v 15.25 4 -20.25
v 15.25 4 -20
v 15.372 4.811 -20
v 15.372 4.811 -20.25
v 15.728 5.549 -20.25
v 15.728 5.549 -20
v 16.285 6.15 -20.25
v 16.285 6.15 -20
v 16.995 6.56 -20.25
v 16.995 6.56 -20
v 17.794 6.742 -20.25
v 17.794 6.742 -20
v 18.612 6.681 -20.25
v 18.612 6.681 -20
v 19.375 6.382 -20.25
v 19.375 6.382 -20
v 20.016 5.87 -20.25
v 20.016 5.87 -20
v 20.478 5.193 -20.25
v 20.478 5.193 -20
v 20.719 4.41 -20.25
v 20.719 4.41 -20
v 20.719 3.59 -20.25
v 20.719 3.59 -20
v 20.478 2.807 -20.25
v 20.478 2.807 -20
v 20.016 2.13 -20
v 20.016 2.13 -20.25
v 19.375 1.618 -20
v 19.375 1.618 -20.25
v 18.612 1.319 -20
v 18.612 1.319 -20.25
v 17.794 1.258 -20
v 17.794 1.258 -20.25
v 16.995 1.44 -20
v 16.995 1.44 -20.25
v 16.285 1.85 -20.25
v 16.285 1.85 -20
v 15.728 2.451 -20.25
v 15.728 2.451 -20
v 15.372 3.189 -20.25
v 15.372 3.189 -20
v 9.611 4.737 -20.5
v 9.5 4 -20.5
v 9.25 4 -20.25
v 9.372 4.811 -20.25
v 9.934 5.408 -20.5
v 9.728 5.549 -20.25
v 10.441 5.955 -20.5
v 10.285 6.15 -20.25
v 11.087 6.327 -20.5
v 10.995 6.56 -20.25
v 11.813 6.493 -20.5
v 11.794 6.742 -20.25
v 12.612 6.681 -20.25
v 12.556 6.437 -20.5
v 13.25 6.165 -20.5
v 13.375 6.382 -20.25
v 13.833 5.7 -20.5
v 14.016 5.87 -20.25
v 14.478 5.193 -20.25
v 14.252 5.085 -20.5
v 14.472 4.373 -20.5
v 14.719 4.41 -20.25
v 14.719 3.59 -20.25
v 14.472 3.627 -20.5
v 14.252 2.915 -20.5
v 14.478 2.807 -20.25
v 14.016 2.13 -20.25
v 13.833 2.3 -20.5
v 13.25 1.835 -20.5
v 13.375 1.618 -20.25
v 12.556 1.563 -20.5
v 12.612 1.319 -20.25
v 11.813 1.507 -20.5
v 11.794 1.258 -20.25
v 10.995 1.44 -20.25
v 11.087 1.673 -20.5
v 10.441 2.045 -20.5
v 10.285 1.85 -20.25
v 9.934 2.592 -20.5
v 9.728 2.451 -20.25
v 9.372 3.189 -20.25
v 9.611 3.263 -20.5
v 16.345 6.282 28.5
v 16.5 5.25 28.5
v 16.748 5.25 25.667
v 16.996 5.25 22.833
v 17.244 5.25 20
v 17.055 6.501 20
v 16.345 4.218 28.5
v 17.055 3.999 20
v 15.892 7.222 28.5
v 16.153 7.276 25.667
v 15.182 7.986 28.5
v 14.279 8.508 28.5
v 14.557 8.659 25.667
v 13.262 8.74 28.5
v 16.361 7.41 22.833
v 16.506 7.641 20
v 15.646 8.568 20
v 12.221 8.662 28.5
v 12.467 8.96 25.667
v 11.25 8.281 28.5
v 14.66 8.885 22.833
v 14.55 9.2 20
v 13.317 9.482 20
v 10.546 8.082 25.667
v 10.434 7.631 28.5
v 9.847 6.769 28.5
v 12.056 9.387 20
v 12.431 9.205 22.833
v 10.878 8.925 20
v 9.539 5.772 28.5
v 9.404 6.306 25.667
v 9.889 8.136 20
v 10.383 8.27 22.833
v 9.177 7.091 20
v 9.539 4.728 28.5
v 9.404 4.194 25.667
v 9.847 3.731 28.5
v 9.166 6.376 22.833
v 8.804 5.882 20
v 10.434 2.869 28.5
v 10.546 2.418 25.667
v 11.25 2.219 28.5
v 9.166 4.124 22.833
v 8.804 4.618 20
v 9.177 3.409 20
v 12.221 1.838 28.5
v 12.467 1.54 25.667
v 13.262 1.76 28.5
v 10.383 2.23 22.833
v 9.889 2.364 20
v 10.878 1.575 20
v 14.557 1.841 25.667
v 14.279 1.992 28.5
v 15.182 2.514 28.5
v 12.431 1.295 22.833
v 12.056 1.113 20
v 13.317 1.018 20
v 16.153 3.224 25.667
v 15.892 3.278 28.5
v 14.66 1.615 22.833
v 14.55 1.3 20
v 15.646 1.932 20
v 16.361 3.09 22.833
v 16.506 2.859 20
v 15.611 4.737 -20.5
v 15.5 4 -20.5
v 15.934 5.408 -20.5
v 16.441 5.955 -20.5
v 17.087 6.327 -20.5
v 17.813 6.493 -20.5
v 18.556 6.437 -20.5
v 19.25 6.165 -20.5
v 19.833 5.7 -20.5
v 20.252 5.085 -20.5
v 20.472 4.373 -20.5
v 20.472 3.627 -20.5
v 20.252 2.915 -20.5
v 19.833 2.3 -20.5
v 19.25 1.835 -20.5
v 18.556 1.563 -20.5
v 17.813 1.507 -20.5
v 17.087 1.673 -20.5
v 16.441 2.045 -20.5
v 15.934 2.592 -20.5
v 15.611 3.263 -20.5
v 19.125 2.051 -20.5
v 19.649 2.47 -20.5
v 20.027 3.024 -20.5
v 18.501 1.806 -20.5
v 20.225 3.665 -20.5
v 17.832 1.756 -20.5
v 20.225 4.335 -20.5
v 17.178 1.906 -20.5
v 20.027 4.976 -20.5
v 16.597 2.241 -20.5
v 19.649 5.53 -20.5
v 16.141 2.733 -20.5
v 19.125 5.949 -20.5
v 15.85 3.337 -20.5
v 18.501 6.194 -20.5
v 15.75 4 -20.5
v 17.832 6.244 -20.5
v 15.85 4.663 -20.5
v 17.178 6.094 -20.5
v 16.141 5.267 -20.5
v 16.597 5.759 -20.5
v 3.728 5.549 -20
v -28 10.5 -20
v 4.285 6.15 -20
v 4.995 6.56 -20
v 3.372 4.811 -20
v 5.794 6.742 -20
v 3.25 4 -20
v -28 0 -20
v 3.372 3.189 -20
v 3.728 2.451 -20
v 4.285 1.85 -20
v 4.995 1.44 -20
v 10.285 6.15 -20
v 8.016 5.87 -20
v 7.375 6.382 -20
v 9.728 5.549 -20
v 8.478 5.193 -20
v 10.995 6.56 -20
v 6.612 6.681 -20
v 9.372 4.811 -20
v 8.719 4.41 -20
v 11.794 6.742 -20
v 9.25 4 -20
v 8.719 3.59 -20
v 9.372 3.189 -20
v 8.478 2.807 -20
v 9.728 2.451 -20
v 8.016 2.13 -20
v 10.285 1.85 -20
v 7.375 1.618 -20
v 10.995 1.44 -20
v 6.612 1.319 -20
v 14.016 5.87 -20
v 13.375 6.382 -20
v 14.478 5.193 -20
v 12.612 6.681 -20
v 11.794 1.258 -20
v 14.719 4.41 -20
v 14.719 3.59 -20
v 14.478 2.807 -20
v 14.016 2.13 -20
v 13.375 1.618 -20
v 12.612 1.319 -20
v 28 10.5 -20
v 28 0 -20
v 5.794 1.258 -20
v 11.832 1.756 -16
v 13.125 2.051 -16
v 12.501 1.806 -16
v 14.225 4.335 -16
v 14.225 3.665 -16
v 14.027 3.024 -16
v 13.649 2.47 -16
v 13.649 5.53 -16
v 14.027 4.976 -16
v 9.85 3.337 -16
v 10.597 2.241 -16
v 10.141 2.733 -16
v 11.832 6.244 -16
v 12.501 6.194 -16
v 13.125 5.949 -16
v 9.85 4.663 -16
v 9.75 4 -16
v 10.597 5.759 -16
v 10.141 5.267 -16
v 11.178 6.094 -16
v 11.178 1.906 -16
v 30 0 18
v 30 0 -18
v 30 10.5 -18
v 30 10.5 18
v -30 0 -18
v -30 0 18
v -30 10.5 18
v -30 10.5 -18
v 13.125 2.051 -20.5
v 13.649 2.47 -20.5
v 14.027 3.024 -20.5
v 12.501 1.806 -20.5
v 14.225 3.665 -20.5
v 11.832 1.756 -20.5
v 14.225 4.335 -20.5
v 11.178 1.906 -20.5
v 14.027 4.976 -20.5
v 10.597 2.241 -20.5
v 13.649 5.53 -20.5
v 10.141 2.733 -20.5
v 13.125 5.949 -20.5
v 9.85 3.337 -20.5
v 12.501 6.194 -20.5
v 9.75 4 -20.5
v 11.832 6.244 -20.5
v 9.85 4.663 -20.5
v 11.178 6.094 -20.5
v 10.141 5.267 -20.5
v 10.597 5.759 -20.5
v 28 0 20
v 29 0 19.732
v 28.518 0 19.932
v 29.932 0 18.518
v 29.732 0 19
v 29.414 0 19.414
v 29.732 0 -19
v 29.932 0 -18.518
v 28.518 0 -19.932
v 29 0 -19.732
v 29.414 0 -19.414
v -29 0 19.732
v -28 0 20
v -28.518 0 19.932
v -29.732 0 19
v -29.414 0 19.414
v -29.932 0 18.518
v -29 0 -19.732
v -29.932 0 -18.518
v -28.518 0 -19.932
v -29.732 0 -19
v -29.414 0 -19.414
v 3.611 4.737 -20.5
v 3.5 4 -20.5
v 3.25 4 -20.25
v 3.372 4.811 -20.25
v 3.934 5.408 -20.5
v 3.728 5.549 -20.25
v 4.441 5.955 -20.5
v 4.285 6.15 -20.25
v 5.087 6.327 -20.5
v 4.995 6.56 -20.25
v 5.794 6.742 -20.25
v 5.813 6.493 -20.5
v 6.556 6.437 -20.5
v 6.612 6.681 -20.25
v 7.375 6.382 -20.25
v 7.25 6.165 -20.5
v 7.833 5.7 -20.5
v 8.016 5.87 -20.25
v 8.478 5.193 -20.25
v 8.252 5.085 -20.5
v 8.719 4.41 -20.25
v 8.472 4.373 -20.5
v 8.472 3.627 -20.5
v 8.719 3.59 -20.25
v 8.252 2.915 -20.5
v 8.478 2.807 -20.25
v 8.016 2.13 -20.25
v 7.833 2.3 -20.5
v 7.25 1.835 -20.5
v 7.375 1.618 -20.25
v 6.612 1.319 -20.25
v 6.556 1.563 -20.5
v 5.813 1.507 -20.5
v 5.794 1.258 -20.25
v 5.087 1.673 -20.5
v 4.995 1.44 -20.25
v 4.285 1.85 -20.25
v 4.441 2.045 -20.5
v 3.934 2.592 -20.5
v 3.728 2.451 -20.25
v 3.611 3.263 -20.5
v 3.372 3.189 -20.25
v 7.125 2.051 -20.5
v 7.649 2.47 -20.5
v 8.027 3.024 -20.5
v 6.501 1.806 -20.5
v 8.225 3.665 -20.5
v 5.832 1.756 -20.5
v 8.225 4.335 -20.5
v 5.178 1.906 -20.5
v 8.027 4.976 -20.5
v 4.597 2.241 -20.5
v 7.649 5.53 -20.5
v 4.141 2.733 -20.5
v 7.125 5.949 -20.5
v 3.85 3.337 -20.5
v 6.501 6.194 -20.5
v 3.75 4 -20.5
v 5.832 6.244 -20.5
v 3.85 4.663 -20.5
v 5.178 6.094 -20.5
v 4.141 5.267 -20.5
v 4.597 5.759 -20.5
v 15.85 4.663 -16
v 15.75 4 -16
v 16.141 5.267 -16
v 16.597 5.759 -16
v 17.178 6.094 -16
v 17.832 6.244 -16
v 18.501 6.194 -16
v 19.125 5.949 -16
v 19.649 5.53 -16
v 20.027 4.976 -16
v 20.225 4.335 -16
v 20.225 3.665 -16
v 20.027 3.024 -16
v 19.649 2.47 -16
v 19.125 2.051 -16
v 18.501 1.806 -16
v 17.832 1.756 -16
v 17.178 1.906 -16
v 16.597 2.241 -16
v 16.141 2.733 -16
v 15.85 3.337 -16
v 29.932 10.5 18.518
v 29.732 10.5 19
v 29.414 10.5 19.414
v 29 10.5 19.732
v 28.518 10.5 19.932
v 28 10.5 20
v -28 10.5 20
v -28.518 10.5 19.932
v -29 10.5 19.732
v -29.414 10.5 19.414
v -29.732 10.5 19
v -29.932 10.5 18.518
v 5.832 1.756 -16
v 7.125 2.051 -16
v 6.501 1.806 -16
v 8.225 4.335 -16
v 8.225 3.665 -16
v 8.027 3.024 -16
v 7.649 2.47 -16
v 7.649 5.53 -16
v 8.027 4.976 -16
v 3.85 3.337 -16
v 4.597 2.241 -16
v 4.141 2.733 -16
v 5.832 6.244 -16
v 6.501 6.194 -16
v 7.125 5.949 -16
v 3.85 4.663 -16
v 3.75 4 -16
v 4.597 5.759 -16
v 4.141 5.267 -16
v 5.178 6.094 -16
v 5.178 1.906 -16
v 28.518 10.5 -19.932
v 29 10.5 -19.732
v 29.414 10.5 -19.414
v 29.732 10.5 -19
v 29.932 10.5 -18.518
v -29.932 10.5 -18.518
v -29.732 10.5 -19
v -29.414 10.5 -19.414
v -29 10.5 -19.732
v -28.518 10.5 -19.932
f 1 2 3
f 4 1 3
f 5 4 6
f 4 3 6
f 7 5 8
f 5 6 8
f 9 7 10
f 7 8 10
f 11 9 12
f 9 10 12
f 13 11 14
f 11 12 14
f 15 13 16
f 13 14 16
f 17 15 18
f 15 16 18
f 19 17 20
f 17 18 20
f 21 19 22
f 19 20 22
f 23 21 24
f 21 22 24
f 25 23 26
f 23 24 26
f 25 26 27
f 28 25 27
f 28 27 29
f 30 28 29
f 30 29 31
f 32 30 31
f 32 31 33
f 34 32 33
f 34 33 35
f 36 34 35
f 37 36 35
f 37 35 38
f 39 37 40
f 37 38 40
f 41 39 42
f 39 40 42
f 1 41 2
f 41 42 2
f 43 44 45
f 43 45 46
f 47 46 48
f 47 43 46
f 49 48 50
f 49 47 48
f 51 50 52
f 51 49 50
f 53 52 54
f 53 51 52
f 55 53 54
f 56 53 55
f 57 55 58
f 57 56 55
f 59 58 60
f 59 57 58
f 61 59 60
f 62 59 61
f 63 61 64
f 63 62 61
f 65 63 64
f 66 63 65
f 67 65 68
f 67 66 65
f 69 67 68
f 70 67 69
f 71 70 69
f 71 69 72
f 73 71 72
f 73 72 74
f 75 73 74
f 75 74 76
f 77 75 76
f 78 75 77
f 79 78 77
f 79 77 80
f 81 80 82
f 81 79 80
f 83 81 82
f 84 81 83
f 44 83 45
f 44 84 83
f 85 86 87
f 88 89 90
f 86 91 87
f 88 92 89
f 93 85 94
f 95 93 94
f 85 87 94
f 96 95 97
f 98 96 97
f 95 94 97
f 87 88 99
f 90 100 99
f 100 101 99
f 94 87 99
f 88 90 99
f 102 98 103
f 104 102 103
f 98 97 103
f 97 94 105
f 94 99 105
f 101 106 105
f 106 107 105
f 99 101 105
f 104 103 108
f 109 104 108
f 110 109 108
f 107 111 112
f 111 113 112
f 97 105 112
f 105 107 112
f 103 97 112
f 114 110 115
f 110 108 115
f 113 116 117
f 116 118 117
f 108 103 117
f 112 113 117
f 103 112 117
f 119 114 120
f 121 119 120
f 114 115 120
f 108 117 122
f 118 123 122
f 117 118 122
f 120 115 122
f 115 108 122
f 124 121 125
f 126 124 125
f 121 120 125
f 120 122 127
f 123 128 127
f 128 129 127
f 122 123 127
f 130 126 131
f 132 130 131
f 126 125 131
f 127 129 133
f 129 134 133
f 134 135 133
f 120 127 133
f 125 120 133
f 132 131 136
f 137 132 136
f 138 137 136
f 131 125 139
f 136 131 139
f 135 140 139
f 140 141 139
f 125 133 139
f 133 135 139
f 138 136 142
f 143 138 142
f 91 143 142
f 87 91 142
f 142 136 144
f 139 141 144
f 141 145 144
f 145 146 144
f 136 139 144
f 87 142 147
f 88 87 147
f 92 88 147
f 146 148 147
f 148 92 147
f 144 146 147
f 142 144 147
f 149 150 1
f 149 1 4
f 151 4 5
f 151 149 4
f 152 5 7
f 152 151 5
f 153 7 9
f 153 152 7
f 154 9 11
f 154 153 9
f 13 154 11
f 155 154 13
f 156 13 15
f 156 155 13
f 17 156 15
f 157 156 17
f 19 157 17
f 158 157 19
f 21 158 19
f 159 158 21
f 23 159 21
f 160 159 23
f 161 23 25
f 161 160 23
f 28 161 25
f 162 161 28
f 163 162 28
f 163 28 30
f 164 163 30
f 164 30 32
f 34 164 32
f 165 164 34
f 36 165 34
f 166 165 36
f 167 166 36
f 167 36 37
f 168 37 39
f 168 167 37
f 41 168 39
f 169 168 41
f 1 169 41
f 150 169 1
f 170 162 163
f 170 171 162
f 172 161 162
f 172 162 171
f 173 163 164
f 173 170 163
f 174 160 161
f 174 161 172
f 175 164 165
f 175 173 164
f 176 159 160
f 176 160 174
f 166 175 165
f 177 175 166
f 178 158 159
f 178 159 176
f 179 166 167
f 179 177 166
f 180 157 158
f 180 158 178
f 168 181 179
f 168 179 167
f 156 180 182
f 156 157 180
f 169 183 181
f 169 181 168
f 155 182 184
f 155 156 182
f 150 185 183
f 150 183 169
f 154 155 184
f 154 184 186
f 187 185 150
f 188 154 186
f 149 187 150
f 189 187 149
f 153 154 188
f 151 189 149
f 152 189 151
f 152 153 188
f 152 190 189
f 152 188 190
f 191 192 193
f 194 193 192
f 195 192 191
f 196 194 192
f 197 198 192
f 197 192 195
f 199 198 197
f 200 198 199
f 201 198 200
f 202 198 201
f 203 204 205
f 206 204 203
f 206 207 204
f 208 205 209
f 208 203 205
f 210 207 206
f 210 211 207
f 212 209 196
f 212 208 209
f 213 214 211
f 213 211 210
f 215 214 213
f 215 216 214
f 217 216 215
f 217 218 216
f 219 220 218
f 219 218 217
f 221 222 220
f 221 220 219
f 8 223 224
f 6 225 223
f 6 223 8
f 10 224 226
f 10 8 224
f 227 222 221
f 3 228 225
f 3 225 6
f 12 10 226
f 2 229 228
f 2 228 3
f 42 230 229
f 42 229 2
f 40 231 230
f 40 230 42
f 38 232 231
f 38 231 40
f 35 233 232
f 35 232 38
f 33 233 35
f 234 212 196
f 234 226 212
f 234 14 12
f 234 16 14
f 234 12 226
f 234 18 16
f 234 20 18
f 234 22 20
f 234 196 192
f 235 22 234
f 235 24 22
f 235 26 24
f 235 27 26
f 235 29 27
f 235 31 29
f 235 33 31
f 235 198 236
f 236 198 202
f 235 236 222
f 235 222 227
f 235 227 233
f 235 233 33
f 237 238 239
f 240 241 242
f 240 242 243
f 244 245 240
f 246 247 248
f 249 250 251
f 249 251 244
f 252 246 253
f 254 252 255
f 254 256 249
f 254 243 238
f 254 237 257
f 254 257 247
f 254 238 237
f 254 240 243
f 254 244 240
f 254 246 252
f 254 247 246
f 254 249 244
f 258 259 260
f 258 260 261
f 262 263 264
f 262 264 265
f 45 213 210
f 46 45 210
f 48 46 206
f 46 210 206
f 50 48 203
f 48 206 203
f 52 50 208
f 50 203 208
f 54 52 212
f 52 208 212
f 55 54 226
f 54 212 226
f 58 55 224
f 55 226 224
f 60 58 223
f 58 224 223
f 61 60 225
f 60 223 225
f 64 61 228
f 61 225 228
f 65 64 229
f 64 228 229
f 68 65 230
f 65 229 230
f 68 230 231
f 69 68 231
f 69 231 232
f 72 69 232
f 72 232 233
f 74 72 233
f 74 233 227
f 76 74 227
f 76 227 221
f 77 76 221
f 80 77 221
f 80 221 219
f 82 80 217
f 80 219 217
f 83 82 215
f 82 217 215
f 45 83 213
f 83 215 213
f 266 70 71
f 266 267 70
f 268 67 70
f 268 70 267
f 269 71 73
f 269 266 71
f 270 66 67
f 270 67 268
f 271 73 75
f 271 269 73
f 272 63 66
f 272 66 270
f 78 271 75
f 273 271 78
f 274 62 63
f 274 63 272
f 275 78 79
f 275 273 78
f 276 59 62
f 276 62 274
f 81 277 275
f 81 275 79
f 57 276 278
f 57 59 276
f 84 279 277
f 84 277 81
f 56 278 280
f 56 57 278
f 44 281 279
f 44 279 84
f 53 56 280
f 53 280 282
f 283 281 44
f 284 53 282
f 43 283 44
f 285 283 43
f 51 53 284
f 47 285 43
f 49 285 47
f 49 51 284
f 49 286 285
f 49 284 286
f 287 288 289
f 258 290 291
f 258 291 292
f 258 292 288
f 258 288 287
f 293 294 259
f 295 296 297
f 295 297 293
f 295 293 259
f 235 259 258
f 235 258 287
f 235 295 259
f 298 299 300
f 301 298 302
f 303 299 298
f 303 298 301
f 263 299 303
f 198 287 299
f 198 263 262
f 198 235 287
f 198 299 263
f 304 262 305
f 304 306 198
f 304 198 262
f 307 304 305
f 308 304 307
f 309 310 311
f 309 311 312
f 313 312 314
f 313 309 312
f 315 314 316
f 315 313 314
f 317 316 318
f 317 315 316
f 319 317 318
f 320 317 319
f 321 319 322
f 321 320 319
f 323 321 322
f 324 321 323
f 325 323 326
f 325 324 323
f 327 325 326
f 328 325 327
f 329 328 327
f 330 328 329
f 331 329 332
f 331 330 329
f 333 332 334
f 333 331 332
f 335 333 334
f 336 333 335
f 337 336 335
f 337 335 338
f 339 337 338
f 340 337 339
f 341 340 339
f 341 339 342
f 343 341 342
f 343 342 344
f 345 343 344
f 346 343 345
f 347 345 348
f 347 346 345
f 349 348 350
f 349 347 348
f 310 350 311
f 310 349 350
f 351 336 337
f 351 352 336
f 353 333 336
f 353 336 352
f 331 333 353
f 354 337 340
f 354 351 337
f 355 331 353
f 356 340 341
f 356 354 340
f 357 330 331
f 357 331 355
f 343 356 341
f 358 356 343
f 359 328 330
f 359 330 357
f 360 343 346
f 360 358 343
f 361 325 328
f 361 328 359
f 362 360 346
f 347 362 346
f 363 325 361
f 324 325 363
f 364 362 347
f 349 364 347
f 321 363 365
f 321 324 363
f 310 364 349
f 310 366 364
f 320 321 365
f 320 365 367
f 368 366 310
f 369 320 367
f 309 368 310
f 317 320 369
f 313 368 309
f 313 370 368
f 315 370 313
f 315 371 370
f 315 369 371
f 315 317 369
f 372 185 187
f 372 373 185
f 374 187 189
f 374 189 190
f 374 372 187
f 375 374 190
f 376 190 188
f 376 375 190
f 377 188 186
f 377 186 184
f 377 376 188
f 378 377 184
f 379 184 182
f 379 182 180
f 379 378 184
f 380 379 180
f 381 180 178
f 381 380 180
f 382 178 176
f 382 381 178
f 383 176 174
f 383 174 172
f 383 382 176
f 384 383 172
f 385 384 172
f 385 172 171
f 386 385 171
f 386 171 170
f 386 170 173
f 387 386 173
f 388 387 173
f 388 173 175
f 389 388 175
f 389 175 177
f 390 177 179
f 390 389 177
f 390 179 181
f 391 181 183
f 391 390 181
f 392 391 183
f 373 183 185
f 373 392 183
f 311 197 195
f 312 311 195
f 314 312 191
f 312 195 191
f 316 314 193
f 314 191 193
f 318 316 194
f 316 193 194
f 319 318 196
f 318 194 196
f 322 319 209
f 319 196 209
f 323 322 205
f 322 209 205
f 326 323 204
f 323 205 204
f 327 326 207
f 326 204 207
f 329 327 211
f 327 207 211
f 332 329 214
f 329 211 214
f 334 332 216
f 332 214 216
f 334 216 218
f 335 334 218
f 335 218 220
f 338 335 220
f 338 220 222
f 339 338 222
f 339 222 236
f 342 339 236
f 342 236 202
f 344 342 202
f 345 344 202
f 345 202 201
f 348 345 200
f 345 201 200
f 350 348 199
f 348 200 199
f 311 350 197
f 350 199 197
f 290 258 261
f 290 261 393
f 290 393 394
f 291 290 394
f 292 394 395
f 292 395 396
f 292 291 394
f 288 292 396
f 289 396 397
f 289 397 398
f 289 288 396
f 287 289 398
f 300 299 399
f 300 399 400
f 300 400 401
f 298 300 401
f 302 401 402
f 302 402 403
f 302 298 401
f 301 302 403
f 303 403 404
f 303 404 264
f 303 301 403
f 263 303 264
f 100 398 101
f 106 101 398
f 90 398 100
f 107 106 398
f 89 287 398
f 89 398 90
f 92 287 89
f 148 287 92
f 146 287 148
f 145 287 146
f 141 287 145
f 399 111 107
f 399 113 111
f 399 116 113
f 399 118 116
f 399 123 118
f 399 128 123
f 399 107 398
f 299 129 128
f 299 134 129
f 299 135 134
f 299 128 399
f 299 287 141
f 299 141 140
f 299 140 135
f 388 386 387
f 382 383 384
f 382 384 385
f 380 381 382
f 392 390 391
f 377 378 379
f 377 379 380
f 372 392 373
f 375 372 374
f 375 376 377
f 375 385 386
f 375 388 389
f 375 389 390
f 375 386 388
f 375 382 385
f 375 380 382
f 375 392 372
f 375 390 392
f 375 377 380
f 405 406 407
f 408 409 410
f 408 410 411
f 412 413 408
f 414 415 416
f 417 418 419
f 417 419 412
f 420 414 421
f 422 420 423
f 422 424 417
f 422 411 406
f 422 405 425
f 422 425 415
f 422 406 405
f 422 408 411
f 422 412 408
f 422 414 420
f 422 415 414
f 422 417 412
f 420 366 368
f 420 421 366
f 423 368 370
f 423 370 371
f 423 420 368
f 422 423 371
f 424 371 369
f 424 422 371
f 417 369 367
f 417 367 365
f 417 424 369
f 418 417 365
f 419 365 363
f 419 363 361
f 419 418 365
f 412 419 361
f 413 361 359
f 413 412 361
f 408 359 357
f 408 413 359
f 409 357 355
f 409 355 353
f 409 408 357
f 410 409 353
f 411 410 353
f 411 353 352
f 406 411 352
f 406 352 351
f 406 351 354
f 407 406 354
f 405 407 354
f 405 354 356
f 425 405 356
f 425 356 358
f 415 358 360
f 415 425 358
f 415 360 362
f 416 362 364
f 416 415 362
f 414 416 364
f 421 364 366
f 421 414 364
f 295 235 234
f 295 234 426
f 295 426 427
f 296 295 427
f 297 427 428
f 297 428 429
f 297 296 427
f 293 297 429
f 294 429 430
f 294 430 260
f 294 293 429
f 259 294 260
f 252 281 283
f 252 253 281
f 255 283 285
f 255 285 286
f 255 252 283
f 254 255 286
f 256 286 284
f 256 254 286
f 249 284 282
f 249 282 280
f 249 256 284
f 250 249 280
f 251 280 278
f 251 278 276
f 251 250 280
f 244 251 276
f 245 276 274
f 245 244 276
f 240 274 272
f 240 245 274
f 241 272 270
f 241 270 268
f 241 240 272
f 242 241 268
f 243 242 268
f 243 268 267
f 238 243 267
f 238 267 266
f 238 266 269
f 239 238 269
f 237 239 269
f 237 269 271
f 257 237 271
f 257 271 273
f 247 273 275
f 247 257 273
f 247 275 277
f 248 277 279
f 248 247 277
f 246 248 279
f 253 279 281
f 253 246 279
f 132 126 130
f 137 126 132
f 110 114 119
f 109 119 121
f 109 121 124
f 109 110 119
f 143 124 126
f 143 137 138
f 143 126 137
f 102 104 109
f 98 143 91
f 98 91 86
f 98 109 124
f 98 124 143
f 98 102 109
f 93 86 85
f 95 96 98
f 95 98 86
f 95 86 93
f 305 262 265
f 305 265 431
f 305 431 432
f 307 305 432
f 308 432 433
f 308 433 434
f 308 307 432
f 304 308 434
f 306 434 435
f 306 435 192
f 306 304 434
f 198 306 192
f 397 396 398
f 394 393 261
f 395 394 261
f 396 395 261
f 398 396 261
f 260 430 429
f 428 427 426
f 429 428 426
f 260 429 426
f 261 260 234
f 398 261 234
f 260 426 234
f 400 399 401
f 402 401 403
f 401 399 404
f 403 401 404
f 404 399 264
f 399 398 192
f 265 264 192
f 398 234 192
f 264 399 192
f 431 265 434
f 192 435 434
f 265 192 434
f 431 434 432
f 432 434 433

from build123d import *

# Parameters (mm, degrees)
EXTRUDE_1_DEPTH     = 10.5
SKETCH_2_R          = 2.25
CUT_EXTRUDE_1_DEPTH = 4
SKETCH_3_R          = 2.75
SKETCH_3_R_2        = 2.25
EXTRUDE_2_DEPTH     = 0.5
CHAMFER_1_SIZE      = 0.25
SKETCH_4_R          = 3.5
EXTRUDE_3_DEPTH     = 8.5
DRAFT_1_ANGLE       = 5


with BuildPart() as part:
    # 草图1 → 凸台-拉伸1 (new body)
    with BuildSketch(Plane(origin=(0, 0, 0), x_dir=(1, 0, 0), z_dir=(0, 1, 0))):
        with BuildLine():
            Line((-28, 20), (28, 20))
            ThreePointArc((28, 20), (29.414213562, 19.414213562), (30, 18))
            Line((30, 18), (30, -18))
            ThreePointArc((30, -18), (29.414213562, -19.414213562), (28, -20))
            Line((28, -20), (-28, -20))
            ThreePointArc((-28, -20), (-29.414213562, -19.414213562), (-30, -18))
            Line((-30, -18), (-30, 18))
            ThreePointArc((-30, 18), (-29.414213562, 19.414213562), (-28, 20))
        make_face()
    extrude(amount=EXTRUDE_1_DEPTH)

    # 草图2 → 切除-拉伸1 (cut)
    with BuildSketch(Plane(origin=(0, 0, -20), x_dir=(-1, 0, 0), z_dir=(0, 0, -1))):
        with Locations((-18, 4)):
            Circle(SKETCH_2_R)
        with Locations((-12, 4)):
            Circle(SKETCH_2_R)
        with Locations((-6, 4)):
            Circle(SKETCH_2_R)
    extrude(amount=-CUT_EXTRUDE_1_DEPTH, mode=Mode.SUBTRACT)

    # 草图3 → 凸台-拉伸2 (add)
    with BuildSketch(Plane(origin=(0, 0, -20), x_dir=(-1, 0, 0), z_dir=(0, 0, -1))):
        with Locations((-18, 4)):
            Circle(SKETCH_3_R)
        with Locations((-18, 4)):
            Circle(SKETCH_3_R_2, mode=Mode.SUBTRACT)
        with Locations((-12, 4)):
            Circle(SKETCH_3_R)
        with Locations((-12, 4)):
            Circle(SKETCH_3_R_2, mode=Mode.SUBTRACT)
        with Locations((-6, 4)):
            Circle(SKETCH_3_R)
        with Locations((-6, 4)):
            Circle(SKETCH_3_R_2, mode=Mode.SUBTRACT)
    extrude(amount=EXTRUDE_2_DEPTH)

    # 倒角1
    chamfer_1_edges = [part.edges().sort_by_distance(p)[0] for p in [
        (20.75, 4, -20.5),
        (14.75, 4, -20.5),
        (8.75, 4, -20.5),
    ]]
    chamfer(chamfer_1_edges, length=CHAMFER_1_SIZE)

    # 草图4 → 凸台-拉伸3 (add)
    with BuildSketch(Plane.XY.offset(20)):
        with Locations((13, 5.25)):
            Circle(SKETCH_4_R)
    extrude(amount=EXTRUDE_3_DEPTH)

    # 拔模1
    draft_1_faces = [part.faces().sort_by_distance(p)[0] for p in [
        (9.5, 5.25, 24.25),
    ]]
    draft(draft_1_faces, Plane(origin=(13, 5.25, 28.5), x_dir=(1, 0, 0), z_dir=(0, 0, 1)), DRAFT_1_ANGLE)


solid = part.part
